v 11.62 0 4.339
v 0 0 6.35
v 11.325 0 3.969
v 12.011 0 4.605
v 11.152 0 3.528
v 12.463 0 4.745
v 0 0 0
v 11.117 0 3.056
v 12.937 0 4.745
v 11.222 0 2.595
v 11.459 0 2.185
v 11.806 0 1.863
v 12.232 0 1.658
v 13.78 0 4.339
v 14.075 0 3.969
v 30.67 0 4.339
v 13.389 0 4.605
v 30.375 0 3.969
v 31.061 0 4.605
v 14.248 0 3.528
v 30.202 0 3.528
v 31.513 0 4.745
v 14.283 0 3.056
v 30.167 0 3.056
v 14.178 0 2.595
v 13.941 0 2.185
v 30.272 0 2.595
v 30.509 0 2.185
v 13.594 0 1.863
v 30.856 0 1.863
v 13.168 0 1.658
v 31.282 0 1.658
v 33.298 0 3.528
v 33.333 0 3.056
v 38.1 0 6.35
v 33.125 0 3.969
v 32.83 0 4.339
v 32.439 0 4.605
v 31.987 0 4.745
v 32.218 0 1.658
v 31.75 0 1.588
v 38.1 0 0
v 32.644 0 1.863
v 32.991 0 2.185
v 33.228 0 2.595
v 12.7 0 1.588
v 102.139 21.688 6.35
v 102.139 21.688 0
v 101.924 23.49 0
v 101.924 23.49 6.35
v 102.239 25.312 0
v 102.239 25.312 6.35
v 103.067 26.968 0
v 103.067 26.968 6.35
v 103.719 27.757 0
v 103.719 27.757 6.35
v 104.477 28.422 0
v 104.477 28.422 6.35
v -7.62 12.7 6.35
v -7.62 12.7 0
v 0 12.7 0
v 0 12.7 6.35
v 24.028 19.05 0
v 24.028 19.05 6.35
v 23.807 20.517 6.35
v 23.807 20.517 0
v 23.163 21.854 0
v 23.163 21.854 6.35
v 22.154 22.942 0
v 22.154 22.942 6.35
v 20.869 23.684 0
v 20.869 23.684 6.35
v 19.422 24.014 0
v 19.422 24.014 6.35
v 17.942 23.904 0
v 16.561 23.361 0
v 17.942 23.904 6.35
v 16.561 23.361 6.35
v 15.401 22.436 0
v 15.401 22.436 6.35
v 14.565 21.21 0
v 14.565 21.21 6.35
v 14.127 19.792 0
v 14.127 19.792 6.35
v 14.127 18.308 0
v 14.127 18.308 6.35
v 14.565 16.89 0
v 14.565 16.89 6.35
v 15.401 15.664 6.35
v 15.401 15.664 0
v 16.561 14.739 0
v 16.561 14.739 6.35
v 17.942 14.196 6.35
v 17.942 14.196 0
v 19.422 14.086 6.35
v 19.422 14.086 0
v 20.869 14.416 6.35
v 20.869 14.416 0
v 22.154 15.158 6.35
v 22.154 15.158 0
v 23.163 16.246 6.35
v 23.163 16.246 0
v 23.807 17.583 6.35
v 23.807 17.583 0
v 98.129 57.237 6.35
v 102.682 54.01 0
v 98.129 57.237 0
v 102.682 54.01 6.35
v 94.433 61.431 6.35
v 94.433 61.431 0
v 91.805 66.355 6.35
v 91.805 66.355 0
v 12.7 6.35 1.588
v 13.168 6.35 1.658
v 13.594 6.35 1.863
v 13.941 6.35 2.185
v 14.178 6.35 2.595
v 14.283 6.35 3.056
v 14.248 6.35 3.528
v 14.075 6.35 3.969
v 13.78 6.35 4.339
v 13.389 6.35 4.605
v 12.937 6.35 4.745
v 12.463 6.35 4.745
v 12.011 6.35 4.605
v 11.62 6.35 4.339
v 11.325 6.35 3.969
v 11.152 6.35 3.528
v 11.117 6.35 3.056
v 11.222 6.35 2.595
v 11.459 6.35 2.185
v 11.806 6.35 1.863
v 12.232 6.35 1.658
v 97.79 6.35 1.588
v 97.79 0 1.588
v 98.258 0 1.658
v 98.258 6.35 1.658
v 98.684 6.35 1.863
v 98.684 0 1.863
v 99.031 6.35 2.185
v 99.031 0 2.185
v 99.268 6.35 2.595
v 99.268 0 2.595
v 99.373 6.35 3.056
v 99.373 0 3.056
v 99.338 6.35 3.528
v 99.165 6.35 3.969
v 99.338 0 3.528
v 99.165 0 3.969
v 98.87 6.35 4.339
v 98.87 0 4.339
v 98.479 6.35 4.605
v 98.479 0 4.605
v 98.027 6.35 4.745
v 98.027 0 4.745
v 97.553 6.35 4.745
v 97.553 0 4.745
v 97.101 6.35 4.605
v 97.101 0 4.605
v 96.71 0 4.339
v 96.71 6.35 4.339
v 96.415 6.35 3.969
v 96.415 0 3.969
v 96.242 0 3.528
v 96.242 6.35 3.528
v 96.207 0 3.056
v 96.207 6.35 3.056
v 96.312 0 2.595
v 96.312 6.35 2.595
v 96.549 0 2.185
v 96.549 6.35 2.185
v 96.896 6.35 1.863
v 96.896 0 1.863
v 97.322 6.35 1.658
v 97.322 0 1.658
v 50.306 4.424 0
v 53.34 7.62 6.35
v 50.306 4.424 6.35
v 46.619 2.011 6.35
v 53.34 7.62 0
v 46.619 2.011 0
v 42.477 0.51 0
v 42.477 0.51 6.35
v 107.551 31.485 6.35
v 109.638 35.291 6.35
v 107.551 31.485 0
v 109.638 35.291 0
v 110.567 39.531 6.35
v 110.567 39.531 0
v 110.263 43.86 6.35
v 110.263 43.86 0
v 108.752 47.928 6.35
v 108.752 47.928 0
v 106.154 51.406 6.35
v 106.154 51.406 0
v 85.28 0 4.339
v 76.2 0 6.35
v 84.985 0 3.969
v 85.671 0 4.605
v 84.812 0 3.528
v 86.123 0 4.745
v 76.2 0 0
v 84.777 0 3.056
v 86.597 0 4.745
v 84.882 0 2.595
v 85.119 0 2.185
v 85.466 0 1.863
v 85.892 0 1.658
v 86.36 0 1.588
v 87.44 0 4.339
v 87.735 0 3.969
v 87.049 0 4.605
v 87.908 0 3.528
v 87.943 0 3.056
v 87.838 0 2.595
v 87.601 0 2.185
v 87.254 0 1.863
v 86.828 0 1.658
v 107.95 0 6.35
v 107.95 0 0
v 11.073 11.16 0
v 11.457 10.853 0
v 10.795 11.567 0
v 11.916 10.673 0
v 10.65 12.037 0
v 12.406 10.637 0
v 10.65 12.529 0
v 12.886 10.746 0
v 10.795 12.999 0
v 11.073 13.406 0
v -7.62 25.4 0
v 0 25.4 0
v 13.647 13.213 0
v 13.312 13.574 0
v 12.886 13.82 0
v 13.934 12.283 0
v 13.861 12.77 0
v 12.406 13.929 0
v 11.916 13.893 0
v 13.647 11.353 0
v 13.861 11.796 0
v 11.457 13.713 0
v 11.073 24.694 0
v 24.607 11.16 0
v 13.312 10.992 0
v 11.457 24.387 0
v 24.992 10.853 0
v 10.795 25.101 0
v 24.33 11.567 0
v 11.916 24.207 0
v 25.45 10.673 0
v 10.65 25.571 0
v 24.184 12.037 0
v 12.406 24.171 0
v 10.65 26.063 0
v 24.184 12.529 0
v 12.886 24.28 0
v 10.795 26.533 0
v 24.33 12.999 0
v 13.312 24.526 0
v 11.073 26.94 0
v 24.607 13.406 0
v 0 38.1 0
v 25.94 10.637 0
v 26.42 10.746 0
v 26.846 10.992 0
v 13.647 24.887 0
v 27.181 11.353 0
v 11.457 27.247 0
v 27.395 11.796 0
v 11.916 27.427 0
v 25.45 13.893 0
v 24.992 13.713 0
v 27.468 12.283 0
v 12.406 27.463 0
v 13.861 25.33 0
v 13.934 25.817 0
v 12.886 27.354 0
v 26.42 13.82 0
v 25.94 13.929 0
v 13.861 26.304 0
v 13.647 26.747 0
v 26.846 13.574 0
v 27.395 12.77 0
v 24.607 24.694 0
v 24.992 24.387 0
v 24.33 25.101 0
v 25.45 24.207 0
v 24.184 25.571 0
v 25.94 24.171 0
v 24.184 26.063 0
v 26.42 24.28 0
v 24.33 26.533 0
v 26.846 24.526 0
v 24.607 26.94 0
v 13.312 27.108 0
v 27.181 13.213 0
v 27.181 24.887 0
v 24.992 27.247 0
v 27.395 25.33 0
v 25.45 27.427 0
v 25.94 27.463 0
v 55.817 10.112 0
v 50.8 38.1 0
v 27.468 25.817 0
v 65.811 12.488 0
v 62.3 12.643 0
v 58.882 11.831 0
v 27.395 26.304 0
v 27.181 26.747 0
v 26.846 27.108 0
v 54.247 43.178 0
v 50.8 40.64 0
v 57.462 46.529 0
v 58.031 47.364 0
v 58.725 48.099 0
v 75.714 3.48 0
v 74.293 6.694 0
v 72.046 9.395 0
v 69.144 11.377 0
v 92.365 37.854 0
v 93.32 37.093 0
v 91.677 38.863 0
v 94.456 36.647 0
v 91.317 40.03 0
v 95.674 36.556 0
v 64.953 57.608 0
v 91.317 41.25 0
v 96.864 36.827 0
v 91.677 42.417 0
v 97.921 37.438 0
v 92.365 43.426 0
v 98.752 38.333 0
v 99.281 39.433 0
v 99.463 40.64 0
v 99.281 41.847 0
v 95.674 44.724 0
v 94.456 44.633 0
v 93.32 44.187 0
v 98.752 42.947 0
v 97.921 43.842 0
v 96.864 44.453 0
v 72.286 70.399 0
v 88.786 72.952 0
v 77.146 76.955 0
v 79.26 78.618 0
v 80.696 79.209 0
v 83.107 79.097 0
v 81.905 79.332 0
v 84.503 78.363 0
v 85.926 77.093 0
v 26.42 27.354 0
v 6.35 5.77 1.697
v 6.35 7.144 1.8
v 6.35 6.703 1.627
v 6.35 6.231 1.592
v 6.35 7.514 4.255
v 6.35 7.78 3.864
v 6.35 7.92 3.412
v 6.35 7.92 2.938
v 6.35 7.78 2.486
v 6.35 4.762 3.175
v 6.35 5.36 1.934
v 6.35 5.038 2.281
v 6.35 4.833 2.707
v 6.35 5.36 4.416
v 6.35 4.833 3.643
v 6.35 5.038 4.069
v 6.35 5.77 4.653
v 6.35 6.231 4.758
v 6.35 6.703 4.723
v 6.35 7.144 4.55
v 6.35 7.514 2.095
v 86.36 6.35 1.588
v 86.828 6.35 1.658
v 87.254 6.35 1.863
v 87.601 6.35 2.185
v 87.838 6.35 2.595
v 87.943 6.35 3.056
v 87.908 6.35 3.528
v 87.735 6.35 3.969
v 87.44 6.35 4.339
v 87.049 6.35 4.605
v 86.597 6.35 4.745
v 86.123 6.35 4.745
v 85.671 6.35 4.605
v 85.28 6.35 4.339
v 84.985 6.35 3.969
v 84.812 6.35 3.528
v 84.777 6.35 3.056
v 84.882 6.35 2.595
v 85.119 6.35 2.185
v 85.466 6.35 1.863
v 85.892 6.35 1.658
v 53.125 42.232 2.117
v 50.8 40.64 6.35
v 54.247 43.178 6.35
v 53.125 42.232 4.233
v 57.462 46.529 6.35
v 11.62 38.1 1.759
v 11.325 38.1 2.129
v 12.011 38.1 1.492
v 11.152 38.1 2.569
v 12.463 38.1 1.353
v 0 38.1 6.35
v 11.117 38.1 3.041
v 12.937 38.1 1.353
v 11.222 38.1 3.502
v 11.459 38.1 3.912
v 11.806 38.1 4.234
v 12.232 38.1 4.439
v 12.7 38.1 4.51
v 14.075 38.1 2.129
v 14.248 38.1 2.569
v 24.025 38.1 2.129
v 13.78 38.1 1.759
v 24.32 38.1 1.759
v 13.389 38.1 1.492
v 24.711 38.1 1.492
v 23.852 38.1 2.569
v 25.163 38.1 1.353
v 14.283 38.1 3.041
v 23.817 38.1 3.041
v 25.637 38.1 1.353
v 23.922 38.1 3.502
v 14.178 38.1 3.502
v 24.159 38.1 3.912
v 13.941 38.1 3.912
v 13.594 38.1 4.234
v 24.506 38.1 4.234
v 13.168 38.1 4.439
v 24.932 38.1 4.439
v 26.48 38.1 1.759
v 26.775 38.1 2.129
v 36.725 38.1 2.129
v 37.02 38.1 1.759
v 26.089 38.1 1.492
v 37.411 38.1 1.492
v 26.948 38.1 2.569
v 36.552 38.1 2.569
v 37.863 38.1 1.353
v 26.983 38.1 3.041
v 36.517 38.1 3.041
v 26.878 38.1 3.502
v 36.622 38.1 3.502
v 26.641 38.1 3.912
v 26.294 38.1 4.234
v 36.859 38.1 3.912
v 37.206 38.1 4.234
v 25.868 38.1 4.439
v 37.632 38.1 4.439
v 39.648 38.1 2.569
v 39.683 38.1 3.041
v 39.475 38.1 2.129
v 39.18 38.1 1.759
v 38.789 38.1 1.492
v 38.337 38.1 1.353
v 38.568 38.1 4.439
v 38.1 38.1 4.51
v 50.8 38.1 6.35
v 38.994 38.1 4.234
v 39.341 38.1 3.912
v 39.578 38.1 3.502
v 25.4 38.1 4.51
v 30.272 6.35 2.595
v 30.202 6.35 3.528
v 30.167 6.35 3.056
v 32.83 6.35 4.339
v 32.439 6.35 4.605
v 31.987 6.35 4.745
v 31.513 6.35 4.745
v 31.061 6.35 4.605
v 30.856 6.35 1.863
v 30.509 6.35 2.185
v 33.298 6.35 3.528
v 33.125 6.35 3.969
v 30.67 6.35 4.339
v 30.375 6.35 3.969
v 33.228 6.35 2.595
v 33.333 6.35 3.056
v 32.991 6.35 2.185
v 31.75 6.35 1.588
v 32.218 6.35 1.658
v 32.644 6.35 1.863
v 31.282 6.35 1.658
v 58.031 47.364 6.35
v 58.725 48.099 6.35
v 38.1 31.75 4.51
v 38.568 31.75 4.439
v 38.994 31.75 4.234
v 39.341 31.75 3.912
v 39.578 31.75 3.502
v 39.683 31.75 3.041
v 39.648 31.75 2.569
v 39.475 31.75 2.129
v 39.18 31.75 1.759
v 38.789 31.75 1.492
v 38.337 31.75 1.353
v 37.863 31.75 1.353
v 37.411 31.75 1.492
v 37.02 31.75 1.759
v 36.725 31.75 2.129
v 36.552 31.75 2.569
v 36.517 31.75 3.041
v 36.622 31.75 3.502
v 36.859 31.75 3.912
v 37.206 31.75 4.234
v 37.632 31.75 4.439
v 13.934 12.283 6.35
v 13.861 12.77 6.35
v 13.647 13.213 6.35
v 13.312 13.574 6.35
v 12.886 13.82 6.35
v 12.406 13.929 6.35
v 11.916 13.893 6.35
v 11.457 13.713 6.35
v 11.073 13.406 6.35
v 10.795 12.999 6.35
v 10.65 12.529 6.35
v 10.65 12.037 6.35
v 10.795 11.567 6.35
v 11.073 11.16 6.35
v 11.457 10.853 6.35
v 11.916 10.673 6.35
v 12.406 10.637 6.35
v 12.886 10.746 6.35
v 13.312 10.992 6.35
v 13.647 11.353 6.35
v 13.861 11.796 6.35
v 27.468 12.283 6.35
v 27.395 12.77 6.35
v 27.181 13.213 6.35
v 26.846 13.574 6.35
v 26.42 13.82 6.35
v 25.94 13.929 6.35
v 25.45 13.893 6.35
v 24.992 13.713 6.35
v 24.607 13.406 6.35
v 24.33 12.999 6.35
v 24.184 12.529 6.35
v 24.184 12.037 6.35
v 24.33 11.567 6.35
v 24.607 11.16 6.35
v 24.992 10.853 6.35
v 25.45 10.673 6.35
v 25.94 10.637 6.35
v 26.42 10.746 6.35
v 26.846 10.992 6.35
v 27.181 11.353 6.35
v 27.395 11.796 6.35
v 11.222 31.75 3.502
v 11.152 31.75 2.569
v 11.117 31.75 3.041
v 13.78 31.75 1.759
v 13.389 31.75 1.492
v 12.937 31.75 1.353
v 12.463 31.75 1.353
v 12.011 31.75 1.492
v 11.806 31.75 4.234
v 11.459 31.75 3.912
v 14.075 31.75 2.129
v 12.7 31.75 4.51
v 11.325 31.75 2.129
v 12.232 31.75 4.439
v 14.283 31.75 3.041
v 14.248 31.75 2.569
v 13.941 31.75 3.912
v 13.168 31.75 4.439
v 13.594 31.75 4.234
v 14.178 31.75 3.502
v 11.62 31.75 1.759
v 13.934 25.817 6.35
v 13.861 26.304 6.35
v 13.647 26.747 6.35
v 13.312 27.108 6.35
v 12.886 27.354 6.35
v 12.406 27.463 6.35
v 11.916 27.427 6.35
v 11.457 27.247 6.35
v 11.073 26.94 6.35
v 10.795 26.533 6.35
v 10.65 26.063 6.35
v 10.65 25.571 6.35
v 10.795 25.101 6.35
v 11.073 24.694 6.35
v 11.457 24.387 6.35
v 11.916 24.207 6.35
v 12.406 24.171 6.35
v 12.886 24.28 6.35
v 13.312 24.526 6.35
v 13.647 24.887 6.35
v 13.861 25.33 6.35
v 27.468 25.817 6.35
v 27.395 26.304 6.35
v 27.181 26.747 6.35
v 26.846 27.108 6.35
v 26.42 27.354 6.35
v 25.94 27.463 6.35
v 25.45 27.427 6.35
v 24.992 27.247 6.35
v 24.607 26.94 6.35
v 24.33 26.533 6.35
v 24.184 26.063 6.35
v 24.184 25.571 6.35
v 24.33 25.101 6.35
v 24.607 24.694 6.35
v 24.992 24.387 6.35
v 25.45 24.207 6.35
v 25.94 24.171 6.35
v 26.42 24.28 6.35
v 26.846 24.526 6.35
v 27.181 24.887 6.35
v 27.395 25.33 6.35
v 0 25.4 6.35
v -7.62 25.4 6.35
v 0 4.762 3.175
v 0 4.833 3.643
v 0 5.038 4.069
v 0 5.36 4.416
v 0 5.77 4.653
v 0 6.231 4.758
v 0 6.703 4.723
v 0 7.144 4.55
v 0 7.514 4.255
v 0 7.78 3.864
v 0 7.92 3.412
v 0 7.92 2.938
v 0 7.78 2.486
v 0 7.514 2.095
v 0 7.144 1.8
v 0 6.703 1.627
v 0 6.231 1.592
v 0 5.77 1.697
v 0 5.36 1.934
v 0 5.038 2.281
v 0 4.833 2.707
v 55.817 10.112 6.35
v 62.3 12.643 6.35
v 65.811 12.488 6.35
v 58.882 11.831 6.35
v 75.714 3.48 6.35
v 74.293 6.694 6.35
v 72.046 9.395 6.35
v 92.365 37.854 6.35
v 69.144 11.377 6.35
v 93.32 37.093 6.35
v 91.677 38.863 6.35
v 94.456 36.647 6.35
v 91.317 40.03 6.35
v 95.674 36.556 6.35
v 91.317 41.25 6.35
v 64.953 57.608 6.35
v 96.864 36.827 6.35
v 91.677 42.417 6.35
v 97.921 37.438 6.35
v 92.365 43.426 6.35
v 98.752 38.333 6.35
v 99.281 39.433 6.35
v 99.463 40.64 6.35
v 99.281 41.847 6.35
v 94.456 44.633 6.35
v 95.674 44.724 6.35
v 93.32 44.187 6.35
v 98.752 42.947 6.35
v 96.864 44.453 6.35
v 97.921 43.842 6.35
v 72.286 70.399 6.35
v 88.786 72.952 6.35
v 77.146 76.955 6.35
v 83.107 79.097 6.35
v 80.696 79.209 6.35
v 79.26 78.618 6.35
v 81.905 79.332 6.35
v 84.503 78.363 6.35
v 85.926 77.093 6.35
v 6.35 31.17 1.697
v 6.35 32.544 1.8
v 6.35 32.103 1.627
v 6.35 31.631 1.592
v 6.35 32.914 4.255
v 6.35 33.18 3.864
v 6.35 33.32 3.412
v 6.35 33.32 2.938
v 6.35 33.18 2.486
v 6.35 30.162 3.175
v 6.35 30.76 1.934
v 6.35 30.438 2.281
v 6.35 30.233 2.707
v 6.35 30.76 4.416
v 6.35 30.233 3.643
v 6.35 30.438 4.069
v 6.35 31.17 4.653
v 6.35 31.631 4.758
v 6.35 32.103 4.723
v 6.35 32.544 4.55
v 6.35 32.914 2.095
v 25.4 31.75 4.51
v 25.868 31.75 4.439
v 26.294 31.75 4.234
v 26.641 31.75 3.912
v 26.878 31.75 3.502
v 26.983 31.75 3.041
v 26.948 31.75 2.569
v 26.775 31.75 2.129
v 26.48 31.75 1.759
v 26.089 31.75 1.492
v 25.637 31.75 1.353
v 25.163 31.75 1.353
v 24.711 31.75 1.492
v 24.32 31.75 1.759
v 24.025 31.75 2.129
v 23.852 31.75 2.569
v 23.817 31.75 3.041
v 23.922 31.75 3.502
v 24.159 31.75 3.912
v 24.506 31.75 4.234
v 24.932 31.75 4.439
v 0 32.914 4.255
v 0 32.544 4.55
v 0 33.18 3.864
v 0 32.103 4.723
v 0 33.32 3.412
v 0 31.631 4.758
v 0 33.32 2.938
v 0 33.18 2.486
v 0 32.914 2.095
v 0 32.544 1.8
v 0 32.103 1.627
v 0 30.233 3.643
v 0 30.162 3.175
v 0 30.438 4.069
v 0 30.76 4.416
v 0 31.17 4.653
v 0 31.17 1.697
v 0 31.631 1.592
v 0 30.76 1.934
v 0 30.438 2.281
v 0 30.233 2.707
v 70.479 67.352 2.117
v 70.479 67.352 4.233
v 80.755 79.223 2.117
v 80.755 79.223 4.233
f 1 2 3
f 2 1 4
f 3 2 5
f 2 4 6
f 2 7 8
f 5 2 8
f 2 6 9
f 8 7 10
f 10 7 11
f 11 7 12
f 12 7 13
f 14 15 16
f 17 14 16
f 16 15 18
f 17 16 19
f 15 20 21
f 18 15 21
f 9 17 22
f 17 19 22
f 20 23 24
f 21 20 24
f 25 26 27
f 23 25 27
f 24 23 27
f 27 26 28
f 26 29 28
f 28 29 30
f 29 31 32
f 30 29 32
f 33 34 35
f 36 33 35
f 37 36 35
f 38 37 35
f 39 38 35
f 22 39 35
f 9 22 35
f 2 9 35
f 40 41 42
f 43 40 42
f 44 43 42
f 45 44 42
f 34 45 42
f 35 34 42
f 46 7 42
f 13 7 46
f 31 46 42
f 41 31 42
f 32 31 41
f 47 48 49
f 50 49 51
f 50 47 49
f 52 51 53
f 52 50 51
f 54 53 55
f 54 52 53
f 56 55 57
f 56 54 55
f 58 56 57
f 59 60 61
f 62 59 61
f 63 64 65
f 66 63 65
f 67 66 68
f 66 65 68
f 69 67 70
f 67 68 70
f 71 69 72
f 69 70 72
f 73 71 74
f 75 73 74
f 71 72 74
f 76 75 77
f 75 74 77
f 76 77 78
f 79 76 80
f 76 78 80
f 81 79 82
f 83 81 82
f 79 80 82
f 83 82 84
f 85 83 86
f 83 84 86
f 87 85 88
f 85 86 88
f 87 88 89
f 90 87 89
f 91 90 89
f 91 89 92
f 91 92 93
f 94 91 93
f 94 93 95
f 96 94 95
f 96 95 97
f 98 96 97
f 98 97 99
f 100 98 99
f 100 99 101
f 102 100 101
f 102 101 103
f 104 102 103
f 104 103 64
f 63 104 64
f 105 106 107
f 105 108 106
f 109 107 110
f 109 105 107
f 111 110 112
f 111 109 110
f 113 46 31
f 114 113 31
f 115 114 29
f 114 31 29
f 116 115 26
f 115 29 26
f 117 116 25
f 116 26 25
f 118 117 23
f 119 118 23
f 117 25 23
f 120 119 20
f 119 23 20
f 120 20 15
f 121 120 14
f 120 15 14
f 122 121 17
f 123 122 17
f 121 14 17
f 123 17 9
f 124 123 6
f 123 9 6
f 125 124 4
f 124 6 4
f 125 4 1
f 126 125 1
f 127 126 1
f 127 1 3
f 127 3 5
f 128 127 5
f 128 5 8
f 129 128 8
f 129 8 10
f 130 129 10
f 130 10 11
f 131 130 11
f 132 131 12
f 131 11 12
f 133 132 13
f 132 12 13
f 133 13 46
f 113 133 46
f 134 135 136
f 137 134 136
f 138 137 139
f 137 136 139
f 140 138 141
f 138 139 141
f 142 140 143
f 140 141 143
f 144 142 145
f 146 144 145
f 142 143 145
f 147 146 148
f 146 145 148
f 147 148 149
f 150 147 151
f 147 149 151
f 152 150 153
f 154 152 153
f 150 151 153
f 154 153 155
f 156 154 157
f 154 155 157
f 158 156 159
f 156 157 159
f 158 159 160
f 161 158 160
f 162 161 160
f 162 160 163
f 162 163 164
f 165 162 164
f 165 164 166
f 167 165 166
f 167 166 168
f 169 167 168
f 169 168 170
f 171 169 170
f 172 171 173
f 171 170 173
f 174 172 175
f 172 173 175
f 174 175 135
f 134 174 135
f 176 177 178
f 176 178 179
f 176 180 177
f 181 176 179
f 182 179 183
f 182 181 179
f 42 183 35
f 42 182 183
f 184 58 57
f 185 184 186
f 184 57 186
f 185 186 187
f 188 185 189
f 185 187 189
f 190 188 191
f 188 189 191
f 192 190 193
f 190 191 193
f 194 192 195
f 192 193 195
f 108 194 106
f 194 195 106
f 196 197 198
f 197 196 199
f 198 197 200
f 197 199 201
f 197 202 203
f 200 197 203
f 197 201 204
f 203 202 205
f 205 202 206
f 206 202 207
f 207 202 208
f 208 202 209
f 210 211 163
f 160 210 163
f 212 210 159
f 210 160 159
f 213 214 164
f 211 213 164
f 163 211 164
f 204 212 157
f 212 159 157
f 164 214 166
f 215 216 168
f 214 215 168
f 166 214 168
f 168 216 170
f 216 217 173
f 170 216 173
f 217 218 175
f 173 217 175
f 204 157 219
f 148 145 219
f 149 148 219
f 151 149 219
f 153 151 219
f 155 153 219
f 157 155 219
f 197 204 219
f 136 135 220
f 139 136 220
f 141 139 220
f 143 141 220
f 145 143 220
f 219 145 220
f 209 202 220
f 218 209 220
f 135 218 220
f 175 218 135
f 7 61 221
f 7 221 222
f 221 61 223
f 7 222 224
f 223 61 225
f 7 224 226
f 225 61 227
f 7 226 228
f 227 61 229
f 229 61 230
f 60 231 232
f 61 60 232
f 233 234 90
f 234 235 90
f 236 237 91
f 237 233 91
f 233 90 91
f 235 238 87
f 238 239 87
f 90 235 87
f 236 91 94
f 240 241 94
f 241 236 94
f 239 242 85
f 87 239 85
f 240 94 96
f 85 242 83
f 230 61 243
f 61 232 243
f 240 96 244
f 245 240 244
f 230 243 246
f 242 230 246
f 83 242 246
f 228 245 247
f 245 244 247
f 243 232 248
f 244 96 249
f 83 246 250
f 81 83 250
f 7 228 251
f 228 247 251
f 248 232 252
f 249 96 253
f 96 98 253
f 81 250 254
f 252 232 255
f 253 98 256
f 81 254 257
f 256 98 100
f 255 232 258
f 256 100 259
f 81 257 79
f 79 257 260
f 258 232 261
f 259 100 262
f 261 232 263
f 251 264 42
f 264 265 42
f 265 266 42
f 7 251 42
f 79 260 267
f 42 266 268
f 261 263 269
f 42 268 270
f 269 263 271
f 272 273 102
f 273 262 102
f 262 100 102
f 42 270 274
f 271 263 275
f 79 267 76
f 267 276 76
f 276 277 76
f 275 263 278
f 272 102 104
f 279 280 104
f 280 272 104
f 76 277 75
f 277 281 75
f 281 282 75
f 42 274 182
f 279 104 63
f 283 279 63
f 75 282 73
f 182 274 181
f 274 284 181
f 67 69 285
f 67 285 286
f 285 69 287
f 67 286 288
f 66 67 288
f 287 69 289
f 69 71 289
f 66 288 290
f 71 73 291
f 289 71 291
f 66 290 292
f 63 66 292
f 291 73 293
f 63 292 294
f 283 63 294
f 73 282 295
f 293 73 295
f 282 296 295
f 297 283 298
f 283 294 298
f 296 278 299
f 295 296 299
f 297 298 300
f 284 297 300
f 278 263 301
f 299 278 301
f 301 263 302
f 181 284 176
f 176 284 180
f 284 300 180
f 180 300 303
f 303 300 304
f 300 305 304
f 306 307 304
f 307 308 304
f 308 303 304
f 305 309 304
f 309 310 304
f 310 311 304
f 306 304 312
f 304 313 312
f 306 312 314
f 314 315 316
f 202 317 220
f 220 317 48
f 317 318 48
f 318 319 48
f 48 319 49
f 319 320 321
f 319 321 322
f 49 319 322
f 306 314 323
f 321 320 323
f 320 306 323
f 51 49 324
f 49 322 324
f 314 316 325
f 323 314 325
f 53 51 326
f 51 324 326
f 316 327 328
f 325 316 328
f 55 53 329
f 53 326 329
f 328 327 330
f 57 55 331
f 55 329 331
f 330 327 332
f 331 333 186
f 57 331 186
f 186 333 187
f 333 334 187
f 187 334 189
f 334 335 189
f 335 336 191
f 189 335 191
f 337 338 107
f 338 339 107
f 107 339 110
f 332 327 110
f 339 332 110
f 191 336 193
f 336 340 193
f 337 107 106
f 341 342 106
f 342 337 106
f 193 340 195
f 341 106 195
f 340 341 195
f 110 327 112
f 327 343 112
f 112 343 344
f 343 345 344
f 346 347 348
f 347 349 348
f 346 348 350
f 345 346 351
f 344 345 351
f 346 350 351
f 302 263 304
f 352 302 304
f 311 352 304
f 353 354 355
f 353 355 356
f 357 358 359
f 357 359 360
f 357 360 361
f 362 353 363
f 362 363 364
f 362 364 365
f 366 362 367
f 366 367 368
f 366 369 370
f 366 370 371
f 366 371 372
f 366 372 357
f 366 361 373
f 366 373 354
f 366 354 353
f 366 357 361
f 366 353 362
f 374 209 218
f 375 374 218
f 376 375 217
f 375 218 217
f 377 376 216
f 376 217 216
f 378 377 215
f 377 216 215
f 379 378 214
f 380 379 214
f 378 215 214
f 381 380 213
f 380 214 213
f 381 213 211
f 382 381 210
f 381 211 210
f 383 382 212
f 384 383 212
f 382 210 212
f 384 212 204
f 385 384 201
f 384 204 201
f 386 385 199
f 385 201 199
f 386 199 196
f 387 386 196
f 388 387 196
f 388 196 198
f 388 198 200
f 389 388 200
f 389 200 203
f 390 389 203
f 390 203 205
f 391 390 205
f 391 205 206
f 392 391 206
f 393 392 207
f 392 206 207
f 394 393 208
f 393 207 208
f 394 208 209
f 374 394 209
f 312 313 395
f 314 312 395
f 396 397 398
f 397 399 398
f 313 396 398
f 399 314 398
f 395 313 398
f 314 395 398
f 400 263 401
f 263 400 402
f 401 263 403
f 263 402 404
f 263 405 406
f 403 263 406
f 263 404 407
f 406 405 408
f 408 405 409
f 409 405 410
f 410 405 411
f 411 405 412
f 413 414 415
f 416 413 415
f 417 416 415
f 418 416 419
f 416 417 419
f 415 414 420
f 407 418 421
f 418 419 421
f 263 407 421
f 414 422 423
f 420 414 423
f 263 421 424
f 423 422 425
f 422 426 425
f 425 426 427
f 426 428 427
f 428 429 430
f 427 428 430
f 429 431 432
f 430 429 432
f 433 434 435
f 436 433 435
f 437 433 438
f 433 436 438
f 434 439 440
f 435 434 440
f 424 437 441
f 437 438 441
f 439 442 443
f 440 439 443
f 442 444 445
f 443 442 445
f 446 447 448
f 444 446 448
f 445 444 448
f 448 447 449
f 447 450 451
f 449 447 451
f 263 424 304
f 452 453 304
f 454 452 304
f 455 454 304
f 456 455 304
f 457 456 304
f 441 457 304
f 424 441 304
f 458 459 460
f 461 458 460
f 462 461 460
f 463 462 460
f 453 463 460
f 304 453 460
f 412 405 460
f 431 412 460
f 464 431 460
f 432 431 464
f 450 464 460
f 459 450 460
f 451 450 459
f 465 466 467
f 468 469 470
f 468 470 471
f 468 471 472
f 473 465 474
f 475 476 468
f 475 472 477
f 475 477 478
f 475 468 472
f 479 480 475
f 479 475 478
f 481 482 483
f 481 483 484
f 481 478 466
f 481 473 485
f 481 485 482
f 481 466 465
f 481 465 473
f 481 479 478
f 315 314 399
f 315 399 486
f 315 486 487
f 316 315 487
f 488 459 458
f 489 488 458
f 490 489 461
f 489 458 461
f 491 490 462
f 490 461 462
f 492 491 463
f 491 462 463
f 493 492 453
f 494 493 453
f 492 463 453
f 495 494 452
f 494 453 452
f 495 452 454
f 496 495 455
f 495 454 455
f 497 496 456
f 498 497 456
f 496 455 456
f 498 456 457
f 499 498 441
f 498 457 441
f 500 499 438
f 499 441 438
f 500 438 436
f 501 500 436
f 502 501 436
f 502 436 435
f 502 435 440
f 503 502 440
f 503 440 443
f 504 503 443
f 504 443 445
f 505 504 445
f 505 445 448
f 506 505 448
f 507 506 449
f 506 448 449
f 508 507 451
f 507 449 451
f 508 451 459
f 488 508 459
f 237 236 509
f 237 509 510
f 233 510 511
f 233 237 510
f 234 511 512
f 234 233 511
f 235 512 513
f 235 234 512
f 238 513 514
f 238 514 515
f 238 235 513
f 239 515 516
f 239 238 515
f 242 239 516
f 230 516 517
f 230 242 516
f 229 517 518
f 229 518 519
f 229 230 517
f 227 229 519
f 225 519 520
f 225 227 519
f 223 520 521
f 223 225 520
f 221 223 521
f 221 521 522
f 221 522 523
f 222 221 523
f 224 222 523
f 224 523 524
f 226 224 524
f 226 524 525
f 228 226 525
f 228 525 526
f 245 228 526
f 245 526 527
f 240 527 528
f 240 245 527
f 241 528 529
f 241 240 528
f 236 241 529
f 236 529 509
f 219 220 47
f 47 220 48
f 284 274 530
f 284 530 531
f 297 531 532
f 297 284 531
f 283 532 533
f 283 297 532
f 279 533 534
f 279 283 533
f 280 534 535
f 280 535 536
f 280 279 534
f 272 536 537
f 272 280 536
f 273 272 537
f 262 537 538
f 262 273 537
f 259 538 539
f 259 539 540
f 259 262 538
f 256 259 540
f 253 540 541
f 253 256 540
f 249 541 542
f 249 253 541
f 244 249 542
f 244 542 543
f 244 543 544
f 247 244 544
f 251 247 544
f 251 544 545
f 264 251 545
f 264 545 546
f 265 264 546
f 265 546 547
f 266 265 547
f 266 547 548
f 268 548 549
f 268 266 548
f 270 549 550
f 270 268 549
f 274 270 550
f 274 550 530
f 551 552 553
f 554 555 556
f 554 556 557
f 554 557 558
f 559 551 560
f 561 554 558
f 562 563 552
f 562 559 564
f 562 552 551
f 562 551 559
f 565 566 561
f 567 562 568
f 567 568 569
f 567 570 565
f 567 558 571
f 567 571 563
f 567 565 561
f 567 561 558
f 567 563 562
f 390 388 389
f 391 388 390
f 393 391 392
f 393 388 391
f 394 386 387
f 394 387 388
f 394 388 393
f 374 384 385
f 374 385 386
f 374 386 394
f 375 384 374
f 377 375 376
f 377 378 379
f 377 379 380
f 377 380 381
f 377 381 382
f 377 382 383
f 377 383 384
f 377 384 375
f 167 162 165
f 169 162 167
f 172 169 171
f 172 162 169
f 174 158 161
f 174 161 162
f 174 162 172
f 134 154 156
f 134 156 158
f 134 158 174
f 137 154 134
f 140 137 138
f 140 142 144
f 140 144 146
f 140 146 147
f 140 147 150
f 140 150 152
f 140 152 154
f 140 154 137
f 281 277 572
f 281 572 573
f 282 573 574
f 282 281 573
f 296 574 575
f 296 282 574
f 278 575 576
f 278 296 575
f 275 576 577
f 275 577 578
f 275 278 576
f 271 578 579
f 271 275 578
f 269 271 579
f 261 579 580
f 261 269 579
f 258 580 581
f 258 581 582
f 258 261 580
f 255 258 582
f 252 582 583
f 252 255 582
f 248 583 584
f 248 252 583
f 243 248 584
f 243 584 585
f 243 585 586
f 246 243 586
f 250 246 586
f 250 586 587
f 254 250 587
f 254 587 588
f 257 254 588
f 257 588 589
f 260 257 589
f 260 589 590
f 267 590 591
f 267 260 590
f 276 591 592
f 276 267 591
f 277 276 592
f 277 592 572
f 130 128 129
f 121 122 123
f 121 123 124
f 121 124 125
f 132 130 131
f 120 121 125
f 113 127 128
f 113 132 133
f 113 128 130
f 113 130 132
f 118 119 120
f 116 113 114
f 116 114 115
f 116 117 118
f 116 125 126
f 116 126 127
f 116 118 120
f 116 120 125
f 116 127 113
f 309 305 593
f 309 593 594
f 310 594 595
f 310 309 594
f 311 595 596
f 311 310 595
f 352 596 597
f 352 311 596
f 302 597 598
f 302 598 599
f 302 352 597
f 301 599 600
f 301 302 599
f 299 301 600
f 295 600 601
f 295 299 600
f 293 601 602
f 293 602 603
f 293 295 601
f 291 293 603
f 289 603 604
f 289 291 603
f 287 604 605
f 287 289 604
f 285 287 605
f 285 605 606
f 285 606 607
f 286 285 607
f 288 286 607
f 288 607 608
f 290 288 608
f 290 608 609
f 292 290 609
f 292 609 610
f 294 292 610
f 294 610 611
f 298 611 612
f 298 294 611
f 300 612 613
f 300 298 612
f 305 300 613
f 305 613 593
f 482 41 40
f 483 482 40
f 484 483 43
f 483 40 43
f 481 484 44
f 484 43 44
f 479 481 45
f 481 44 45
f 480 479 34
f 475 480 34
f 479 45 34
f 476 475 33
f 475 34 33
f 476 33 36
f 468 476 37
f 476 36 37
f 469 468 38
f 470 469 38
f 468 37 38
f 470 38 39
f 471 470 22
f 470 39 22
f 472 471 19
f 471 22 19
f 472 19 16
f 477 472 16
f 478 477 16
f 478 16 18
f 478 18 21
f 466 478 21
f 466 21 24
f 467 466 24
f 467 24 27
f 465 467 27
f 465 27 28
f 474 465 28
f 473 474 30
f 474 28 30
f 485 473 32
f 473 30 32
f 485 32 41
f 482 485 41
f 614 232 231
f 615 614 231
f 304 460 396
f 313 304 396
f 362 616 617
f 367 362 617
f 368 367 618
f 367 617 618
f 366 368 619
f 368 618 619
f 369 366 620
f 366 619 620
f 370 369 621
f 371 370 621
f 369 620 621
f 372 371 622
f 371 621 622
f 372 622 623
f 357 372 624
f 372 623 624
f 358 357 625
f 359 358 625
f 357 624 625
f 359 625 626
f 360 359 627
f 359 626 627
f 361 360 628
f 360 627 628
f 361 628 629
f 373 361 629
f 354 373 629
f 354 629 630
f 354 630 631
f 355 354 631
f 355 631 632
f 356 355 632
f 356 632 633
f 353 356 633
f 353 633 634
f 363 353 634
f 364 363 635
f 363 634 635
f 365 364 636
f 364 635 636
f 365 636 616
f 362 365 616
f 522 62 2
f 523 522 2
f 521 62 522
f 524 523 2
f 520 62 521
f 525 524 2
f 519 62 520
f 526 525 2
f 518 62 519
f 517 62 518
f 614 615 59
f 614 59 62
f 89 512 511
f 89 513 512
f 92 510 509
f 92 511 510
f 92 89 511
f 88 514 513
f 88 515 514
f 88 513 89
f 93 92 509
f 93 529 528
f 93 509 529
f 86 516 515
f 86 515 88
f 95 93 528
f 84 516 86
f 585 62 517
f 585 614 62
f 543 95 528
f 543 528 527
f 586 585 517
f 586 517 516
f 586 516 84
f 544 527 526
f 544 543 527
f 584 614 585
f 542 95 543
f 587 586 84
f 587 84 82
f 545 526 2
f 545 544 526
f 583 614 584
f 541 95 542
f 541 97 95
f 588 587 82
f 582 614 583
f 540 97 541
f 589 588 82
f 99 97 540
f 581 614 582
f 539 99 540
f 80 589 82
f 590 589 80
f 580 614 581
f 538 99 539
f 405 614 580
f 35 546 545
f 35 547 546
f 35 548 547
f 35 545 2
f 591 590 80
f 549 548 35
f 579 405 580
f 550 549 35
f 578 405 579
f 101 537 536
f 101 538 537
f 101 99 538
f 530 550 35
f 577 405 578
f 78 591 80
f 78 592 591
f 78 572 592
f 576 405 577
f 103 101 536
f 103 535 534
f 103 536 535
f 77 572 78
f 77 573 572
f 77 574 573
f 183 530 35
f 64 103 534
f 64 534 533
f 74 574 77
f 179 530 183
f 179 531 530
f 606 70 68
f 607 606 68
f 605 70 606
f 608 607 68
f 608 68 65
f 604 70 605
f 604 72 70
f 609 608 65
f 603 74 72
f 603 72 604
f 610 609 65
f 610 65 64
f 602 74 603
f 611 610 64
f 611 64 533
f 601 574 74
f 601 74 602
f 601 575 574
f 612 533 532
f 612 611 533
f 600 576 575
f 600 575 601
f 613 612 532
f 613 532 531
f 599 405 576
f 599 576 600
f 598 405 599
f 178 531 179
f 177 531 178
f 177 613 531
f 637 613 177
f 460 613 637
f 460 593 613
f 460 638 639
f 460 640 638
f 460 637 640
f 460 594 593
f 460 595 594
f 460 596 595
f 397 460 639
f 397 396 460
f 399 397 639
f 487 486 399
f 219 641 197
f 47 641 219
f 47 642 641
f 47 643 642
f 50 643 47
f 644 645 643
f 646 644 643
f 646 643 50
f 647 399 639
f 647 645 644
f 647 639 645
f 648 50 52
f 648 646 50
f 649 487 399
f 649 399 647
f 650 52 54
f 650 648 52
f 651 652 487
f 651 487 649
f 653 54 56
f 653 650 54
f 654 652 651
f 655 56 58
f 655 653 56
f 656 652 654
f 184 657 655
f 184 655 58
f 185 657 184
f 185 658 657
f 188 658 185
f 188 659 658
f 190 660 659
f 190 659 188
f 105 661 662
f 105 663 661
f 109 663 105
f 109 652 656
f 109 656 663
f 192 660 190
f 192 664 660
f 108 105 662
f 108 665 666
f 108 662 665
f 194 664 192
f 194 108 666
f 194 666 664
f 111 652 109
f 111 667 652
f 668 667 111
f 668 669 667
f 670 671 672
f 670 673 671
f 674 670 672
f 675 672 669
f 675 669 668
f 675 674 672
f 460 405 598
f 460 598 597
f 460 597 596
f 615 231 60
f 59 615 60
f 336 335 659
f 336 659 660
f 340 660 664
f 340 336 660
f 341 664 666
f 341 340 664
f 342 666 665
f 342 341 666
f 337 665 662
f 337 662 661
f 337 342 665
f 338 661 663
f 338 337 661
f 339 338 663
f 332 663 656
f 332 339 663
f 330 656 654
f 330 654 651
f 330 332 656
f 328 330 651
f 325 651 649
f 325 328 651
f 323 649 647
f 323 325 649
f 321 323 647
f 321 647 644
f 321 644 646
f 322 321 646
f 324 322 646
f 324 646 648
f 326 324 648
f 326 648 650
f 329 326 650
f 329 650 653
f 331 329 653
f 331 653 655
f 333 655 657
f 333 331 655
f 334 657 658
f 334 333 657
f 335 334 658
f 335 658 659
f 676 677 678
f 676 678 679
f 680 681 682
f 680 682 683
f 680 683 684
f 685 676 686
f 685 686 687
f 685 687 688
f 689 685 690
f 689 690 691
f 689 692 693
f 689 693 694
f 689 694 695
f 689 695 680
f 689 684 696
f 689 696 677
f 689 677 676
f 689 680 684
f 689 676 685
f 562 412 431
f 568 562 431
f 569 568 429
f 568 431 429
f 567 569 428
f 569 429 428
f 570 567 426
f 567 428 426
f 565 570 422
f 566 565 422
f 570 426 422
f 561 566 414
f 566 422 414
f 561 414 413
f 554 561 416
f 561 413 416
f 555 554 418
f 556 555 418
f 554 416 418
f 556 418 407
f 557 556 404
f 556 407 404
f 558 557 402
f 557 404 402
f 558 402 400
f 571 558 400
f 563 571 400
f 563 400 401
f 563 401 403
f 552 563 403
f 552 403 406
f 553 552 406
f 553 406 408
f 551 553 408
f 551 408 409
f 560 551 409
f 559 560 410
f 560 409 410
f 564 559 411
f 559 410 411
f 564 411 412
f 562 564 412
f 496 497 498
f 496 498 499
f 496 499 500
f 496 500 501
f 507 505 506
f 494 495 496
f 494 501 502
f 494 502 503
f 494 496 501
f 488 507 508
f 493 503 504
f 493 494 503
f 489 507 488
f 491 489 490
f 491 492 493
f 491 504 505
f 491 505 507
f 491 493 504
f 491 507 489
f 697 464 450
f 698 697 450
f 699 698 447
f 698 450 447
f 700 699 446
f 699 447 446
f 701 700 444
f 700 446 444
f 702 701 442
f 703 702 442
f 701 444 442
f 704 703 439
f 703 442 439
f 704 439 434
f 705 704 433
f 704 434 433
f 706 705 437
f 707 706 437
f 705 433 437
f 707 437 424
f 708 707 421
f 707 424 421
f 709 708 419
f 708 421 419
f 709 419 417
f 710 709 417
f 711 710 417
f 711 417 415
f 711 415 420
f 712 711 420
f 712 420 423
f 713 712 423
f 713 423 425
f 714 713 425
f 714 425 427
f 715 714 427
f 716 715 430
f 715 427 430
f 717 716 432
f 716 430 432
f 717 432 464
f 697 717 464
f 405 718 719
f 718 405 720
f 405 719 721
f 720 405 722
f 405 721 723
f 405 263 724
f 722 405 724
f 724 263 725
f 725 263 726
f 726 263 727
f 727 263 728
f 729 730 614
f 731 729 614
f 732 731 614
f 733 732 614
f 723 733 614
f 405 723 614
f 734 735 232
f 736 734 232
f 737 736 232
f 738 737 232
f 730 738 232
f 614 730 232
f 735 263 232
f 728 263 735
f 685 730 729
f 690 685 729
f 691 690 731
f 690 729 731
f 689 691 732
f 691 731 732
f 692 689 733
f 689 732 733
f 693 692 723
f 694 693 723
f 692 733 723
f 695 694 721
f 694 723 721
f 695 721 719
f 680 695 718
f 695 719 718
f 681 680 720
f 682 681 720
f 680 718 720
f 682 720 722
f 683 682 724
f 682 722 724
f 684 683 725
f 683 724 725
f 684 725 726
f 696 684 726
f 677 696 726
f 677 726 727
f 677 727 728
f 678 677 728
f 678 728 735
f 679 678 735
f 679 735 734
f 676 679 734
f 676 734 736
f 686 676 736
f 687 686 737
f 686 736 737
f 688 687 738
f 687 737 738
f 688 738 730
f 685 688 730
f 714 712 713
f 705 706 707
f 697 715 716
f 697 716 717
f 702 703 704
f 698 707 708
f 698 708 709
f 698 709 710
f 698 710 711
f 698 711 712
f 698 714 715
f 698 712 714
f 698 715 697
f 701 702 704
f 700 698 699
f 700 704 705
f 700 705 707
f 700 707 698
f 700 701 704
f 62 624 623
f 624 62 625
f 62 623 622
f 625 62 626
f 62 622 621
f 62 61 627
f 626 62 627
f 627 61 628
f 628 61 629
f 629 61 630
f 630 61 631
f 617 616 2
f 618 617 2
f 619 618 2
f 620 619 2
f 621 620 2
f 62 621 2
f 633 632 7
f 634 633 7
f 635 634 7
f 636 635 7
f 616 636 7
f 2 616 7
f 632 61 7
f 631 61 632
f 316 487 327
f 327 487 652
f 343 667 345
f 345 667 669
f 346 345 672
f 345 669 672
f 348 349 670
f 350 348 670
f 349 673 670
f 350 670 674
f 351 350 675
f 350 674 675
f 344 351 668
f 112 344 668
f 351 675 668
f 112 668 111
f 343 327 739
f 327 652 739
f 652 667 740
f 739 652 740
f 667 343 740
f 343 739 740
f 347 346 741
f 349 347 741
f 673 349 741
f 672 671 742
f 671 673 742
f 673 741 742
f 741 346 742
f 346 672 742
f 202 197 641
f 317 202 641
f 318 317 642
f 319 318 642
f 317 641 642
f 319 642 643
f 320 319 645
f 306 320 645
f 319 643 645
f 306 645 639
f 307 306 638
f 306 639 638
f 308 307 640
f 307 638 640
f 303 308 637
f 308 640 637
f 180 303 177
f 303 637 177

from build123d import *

# Parameters (mm, degrees)
SKETCH1_R           = 4.09575
SKETCH1_R_2         = 1.651
BOSS_EXTRUDE1_DEPTH = 6.35
SKETCH3_R           = 1.5875
CUT_EXTRUDE1_DEPTH  = 6.35
CUT_EXTRUDE2_DEPTH  = 6.35
SKETCH7_R           = 4.9784
CUT_EXTRUDE3_DEPTH  = 125.084268237
FILLET1_R           = 6.35
SKETCH8_W           = 50.8
SKETCH8_H           = 12.7
CUT_EXTRUDE4_DEPTH  = 50.8
CUT_EXTRUDE5_DEPTH  = 19.304
FILLET6_R           = 6.35
FILLET7_R           = 6.35
FILLET8_R           = 19.05
SKETCH10_R          = 1.5875
CUT_EXTRUDE6_DEPTH  = 6.35
SKETCH11_R          = 1.5875
CUT_EXTRUDE7_DEPTH  = 6.35
BOSS_EXTRUDE2_DEPTH = 6.35
FILLET9_R           = 24.13


with BuildPart() as part:
    # Sketch1 → Boss-Extrude1 (new body)
    with BuildSketch(Plane.XY):
        with BuildLine():
            Line((0, 0), (107.95, 0))
            Line((107.95, 0), (100.9362606, 26.175631792))
            Line((100.9362606, 26.175631792), (100.868755024, 26.427566033))
            ThreePointArc((100.868755024, 26.427566033), (110.348359368, 43.438223217), (95.367453293, 55.88))
            Line((95.367453293, 55.88), (0, 38.1))
            Line((0, 38.1), (0, 25.4))
            Line((0, 25.4), (-7.62, 25.4))
            Line((-7.62, 25.4), (-7.62, 12.7))
            Line((-7.62, 12.7), (0, 12.7))
            Line((0, 12.7), (0, 0))
        make_face()
        with Locations((95.367453293, 40.64)):
            Circle(SKETCH1_R, mode=Mode.SUBTRACT)
        with Locations((25.817011896, 25.817011896)):
            Circle(SKETCH1_R_2, mode=Mode.SUBTRACT)
        with Locations((25.817011896, 12.282988104)):
            Circle(SKETCH1_R_2, mode=Mode.SUBTRACT)
        with Locations((12.282988104, 12.282988104)):
            Circle(SKETCH1_R_2, mode=Mode.SUBTRACT)
        with Locations((12.282988104, 25.817011896)):
            Circle(SKETCH1_R_2, mode=Mode.SUBTRACT)
    extrude(amount=BOSS_EXTRUDE1_DEPTH)

    # Sketch3 → Cut-Extrude1 (cut)
    with BuildSketch(Plane.ZY):
        with Locations(Location((3.175, 31.75, 0), (0, 0, 270))):
            Circle(SKETCH3_R)
        with Locations(Location((3.175, 6.35, 0), (0, 0, 270))):
            Circle(SKETCH3_R)
    extrude(amount=-CUT_EXTRUDE1_DEPTH, mode=Mode.SUBTRACT)

    # Sketch6 → Cut-Extrude2 (cut)
    with BuildSketch(Plane.XY.offset(6.35)):
        with BuildLine():
            Line((50.8, 0), (76.2, 0))
            ThreePointArc((76.2, 0), (63.5, 12.7), (50.8, 0))
        make_face()
    extrude(amount=-CUT_EXTRUDE2_DEPTH, mode=Mode.SUBTRACT)

    # Sketch7 → Cut-Extrude3 (cut, through all)
    with BuildSketch(Plane.XY.offset(6.35)):
        with Locations((19.05, 19.05)):
            Circle(SKETCH7_R)
    extrude(amount=-CUT_EXTRUDE3_DEPTH, mode=Mode.SUBTRACT)

    # Fillet1
    fillet1_edges = [part.edges().sort_by_distance(p)[0] for p in [
        (100.868755024, 26.427566033, 3.175),
    ]]
    fillet(fillet1_edges, radius=FILLET1_R)

    # Sketch8 → Cut-Extrude4 (cut)
    with BuildSketch(Plane.XY.offset(6.35)):
        with Locations((25.4, 44.45)):
            Rectangle(SKETCH8_W, SKETCH8_H)
    extrude(amount=-CUT_EXTRUDE4_DEPTH, mode=Mode.SUBTRACT)

    # Sketch9 → Cut-Extrude5 (cut)
    with BuildSketch(Plane.XY.offset(6.35)):
        Polygon((50.8, 47.57098794), (50.8, 40.64), (57.15, 40.64), (57.15, 48.754861432), align=None)
    extrude(amount=-CUT_EXTRUDE5_DEPTH, mode=Mode.SUBTRACT)

    # Fillet6
    fillet6_edges = [part.edges().sort_by_distance(p)[0] for p in [
        (57.15, 40.64, 3.175),
    ]]
    fillet(fillet6_edges, radius=FILLET6_R - 0.0001)  # a hair under: the kernel refuses the full size

    # Fillet7
    fillet7_edges = [part.edges().sort_by_distance(p)[0] for p in [
        (57.15, 48.754861432, 3.175),
    ]]
    fillet(fillet7_edges, radius=FILLET7_R)

    # Fillet8
    fillet8_edges = [part.edges().sort_by_distance(p)[0] for p in [
        (50.8, 0, 3.175),
    ]]
    fillet(fillet8_edges, radius=FILLET8_R)

    # Sketch10 → Cut-Extrude6 (cut)
    with BuildSketch(Plane.XZ):
        with Locations(Location((97.79, 3.175, 0), (0, 0, 270))):
            Circle(SKETCH10_R)
        with Locations(Location((86.36, 3.175, 0), (0, 0, 270))):
            Circle(SKETCH10_R)
        with Locations(Location((31.75, 3.175, 0), (0, 0, 270))):
            Circle(SKETCH10_R)
        with Locations(Location((12.7, 3.175, 0), (0, 0, 270))):
            Circle(SKETCH10_R)
    extrude(amount=-CUT_EXTRUDE6_DEPTH, mode=Mode.SUBTRACT)

    # Sketch11 → Cut-Extrude7 (cut)
    with BuildSketch(Plane(origin=(0, 38.1, 0), x_dir=(1, 0, 0), z_dir=(0, 1, 0))):
        with Locations(Location((12.7, -2.922371253, 0), (0, 0, 270))):
            Circle(SKETCH11_R)
        with Locations(Location((25.4, -2.922371253, 0), (0, 0, 270))):
            Circle(SKETCH11_R)
        with Locations(Location((38.1, -2.922371253, 0), (0, 0, 270))):
            Circle(SKETCH11_R)
    extrude(amount=-CUT_EXTRUDE7_DEPTH, mode=Mode.SUBTRACT)

    # Sketch12 → Boss-Extrude2 (add)
    with BuildSketch(Plane.XY.offset(6.35)):
        with BuildLine():
            Line((50.8, 40.64), (85.027112904, 40.64))
            Line((85.027112904, 40.64), (95.367453293, 55.88))
            add(Edge.make_bspline(
                [(50.8, 40.64), (70.777788932, 52.178803671), (78.594281742, 111.543427795), (95.367453293, 55.88)],
                knots=[0, 0, 0, 0, 1, 1, 1, 1], degree=3))
        make_face()
    extrude(amount=-BOSS_EXTRUDE2_DEPTH)

    # Fillet9
    fillet9_edges = [part.edges().sort_by_distance(p)[0] for p in [
        (95.367453293, 55.88, 3.175),
    ]]
    fillet(fillet9_edges, radius=FILLET9_R)


solid = part.part
